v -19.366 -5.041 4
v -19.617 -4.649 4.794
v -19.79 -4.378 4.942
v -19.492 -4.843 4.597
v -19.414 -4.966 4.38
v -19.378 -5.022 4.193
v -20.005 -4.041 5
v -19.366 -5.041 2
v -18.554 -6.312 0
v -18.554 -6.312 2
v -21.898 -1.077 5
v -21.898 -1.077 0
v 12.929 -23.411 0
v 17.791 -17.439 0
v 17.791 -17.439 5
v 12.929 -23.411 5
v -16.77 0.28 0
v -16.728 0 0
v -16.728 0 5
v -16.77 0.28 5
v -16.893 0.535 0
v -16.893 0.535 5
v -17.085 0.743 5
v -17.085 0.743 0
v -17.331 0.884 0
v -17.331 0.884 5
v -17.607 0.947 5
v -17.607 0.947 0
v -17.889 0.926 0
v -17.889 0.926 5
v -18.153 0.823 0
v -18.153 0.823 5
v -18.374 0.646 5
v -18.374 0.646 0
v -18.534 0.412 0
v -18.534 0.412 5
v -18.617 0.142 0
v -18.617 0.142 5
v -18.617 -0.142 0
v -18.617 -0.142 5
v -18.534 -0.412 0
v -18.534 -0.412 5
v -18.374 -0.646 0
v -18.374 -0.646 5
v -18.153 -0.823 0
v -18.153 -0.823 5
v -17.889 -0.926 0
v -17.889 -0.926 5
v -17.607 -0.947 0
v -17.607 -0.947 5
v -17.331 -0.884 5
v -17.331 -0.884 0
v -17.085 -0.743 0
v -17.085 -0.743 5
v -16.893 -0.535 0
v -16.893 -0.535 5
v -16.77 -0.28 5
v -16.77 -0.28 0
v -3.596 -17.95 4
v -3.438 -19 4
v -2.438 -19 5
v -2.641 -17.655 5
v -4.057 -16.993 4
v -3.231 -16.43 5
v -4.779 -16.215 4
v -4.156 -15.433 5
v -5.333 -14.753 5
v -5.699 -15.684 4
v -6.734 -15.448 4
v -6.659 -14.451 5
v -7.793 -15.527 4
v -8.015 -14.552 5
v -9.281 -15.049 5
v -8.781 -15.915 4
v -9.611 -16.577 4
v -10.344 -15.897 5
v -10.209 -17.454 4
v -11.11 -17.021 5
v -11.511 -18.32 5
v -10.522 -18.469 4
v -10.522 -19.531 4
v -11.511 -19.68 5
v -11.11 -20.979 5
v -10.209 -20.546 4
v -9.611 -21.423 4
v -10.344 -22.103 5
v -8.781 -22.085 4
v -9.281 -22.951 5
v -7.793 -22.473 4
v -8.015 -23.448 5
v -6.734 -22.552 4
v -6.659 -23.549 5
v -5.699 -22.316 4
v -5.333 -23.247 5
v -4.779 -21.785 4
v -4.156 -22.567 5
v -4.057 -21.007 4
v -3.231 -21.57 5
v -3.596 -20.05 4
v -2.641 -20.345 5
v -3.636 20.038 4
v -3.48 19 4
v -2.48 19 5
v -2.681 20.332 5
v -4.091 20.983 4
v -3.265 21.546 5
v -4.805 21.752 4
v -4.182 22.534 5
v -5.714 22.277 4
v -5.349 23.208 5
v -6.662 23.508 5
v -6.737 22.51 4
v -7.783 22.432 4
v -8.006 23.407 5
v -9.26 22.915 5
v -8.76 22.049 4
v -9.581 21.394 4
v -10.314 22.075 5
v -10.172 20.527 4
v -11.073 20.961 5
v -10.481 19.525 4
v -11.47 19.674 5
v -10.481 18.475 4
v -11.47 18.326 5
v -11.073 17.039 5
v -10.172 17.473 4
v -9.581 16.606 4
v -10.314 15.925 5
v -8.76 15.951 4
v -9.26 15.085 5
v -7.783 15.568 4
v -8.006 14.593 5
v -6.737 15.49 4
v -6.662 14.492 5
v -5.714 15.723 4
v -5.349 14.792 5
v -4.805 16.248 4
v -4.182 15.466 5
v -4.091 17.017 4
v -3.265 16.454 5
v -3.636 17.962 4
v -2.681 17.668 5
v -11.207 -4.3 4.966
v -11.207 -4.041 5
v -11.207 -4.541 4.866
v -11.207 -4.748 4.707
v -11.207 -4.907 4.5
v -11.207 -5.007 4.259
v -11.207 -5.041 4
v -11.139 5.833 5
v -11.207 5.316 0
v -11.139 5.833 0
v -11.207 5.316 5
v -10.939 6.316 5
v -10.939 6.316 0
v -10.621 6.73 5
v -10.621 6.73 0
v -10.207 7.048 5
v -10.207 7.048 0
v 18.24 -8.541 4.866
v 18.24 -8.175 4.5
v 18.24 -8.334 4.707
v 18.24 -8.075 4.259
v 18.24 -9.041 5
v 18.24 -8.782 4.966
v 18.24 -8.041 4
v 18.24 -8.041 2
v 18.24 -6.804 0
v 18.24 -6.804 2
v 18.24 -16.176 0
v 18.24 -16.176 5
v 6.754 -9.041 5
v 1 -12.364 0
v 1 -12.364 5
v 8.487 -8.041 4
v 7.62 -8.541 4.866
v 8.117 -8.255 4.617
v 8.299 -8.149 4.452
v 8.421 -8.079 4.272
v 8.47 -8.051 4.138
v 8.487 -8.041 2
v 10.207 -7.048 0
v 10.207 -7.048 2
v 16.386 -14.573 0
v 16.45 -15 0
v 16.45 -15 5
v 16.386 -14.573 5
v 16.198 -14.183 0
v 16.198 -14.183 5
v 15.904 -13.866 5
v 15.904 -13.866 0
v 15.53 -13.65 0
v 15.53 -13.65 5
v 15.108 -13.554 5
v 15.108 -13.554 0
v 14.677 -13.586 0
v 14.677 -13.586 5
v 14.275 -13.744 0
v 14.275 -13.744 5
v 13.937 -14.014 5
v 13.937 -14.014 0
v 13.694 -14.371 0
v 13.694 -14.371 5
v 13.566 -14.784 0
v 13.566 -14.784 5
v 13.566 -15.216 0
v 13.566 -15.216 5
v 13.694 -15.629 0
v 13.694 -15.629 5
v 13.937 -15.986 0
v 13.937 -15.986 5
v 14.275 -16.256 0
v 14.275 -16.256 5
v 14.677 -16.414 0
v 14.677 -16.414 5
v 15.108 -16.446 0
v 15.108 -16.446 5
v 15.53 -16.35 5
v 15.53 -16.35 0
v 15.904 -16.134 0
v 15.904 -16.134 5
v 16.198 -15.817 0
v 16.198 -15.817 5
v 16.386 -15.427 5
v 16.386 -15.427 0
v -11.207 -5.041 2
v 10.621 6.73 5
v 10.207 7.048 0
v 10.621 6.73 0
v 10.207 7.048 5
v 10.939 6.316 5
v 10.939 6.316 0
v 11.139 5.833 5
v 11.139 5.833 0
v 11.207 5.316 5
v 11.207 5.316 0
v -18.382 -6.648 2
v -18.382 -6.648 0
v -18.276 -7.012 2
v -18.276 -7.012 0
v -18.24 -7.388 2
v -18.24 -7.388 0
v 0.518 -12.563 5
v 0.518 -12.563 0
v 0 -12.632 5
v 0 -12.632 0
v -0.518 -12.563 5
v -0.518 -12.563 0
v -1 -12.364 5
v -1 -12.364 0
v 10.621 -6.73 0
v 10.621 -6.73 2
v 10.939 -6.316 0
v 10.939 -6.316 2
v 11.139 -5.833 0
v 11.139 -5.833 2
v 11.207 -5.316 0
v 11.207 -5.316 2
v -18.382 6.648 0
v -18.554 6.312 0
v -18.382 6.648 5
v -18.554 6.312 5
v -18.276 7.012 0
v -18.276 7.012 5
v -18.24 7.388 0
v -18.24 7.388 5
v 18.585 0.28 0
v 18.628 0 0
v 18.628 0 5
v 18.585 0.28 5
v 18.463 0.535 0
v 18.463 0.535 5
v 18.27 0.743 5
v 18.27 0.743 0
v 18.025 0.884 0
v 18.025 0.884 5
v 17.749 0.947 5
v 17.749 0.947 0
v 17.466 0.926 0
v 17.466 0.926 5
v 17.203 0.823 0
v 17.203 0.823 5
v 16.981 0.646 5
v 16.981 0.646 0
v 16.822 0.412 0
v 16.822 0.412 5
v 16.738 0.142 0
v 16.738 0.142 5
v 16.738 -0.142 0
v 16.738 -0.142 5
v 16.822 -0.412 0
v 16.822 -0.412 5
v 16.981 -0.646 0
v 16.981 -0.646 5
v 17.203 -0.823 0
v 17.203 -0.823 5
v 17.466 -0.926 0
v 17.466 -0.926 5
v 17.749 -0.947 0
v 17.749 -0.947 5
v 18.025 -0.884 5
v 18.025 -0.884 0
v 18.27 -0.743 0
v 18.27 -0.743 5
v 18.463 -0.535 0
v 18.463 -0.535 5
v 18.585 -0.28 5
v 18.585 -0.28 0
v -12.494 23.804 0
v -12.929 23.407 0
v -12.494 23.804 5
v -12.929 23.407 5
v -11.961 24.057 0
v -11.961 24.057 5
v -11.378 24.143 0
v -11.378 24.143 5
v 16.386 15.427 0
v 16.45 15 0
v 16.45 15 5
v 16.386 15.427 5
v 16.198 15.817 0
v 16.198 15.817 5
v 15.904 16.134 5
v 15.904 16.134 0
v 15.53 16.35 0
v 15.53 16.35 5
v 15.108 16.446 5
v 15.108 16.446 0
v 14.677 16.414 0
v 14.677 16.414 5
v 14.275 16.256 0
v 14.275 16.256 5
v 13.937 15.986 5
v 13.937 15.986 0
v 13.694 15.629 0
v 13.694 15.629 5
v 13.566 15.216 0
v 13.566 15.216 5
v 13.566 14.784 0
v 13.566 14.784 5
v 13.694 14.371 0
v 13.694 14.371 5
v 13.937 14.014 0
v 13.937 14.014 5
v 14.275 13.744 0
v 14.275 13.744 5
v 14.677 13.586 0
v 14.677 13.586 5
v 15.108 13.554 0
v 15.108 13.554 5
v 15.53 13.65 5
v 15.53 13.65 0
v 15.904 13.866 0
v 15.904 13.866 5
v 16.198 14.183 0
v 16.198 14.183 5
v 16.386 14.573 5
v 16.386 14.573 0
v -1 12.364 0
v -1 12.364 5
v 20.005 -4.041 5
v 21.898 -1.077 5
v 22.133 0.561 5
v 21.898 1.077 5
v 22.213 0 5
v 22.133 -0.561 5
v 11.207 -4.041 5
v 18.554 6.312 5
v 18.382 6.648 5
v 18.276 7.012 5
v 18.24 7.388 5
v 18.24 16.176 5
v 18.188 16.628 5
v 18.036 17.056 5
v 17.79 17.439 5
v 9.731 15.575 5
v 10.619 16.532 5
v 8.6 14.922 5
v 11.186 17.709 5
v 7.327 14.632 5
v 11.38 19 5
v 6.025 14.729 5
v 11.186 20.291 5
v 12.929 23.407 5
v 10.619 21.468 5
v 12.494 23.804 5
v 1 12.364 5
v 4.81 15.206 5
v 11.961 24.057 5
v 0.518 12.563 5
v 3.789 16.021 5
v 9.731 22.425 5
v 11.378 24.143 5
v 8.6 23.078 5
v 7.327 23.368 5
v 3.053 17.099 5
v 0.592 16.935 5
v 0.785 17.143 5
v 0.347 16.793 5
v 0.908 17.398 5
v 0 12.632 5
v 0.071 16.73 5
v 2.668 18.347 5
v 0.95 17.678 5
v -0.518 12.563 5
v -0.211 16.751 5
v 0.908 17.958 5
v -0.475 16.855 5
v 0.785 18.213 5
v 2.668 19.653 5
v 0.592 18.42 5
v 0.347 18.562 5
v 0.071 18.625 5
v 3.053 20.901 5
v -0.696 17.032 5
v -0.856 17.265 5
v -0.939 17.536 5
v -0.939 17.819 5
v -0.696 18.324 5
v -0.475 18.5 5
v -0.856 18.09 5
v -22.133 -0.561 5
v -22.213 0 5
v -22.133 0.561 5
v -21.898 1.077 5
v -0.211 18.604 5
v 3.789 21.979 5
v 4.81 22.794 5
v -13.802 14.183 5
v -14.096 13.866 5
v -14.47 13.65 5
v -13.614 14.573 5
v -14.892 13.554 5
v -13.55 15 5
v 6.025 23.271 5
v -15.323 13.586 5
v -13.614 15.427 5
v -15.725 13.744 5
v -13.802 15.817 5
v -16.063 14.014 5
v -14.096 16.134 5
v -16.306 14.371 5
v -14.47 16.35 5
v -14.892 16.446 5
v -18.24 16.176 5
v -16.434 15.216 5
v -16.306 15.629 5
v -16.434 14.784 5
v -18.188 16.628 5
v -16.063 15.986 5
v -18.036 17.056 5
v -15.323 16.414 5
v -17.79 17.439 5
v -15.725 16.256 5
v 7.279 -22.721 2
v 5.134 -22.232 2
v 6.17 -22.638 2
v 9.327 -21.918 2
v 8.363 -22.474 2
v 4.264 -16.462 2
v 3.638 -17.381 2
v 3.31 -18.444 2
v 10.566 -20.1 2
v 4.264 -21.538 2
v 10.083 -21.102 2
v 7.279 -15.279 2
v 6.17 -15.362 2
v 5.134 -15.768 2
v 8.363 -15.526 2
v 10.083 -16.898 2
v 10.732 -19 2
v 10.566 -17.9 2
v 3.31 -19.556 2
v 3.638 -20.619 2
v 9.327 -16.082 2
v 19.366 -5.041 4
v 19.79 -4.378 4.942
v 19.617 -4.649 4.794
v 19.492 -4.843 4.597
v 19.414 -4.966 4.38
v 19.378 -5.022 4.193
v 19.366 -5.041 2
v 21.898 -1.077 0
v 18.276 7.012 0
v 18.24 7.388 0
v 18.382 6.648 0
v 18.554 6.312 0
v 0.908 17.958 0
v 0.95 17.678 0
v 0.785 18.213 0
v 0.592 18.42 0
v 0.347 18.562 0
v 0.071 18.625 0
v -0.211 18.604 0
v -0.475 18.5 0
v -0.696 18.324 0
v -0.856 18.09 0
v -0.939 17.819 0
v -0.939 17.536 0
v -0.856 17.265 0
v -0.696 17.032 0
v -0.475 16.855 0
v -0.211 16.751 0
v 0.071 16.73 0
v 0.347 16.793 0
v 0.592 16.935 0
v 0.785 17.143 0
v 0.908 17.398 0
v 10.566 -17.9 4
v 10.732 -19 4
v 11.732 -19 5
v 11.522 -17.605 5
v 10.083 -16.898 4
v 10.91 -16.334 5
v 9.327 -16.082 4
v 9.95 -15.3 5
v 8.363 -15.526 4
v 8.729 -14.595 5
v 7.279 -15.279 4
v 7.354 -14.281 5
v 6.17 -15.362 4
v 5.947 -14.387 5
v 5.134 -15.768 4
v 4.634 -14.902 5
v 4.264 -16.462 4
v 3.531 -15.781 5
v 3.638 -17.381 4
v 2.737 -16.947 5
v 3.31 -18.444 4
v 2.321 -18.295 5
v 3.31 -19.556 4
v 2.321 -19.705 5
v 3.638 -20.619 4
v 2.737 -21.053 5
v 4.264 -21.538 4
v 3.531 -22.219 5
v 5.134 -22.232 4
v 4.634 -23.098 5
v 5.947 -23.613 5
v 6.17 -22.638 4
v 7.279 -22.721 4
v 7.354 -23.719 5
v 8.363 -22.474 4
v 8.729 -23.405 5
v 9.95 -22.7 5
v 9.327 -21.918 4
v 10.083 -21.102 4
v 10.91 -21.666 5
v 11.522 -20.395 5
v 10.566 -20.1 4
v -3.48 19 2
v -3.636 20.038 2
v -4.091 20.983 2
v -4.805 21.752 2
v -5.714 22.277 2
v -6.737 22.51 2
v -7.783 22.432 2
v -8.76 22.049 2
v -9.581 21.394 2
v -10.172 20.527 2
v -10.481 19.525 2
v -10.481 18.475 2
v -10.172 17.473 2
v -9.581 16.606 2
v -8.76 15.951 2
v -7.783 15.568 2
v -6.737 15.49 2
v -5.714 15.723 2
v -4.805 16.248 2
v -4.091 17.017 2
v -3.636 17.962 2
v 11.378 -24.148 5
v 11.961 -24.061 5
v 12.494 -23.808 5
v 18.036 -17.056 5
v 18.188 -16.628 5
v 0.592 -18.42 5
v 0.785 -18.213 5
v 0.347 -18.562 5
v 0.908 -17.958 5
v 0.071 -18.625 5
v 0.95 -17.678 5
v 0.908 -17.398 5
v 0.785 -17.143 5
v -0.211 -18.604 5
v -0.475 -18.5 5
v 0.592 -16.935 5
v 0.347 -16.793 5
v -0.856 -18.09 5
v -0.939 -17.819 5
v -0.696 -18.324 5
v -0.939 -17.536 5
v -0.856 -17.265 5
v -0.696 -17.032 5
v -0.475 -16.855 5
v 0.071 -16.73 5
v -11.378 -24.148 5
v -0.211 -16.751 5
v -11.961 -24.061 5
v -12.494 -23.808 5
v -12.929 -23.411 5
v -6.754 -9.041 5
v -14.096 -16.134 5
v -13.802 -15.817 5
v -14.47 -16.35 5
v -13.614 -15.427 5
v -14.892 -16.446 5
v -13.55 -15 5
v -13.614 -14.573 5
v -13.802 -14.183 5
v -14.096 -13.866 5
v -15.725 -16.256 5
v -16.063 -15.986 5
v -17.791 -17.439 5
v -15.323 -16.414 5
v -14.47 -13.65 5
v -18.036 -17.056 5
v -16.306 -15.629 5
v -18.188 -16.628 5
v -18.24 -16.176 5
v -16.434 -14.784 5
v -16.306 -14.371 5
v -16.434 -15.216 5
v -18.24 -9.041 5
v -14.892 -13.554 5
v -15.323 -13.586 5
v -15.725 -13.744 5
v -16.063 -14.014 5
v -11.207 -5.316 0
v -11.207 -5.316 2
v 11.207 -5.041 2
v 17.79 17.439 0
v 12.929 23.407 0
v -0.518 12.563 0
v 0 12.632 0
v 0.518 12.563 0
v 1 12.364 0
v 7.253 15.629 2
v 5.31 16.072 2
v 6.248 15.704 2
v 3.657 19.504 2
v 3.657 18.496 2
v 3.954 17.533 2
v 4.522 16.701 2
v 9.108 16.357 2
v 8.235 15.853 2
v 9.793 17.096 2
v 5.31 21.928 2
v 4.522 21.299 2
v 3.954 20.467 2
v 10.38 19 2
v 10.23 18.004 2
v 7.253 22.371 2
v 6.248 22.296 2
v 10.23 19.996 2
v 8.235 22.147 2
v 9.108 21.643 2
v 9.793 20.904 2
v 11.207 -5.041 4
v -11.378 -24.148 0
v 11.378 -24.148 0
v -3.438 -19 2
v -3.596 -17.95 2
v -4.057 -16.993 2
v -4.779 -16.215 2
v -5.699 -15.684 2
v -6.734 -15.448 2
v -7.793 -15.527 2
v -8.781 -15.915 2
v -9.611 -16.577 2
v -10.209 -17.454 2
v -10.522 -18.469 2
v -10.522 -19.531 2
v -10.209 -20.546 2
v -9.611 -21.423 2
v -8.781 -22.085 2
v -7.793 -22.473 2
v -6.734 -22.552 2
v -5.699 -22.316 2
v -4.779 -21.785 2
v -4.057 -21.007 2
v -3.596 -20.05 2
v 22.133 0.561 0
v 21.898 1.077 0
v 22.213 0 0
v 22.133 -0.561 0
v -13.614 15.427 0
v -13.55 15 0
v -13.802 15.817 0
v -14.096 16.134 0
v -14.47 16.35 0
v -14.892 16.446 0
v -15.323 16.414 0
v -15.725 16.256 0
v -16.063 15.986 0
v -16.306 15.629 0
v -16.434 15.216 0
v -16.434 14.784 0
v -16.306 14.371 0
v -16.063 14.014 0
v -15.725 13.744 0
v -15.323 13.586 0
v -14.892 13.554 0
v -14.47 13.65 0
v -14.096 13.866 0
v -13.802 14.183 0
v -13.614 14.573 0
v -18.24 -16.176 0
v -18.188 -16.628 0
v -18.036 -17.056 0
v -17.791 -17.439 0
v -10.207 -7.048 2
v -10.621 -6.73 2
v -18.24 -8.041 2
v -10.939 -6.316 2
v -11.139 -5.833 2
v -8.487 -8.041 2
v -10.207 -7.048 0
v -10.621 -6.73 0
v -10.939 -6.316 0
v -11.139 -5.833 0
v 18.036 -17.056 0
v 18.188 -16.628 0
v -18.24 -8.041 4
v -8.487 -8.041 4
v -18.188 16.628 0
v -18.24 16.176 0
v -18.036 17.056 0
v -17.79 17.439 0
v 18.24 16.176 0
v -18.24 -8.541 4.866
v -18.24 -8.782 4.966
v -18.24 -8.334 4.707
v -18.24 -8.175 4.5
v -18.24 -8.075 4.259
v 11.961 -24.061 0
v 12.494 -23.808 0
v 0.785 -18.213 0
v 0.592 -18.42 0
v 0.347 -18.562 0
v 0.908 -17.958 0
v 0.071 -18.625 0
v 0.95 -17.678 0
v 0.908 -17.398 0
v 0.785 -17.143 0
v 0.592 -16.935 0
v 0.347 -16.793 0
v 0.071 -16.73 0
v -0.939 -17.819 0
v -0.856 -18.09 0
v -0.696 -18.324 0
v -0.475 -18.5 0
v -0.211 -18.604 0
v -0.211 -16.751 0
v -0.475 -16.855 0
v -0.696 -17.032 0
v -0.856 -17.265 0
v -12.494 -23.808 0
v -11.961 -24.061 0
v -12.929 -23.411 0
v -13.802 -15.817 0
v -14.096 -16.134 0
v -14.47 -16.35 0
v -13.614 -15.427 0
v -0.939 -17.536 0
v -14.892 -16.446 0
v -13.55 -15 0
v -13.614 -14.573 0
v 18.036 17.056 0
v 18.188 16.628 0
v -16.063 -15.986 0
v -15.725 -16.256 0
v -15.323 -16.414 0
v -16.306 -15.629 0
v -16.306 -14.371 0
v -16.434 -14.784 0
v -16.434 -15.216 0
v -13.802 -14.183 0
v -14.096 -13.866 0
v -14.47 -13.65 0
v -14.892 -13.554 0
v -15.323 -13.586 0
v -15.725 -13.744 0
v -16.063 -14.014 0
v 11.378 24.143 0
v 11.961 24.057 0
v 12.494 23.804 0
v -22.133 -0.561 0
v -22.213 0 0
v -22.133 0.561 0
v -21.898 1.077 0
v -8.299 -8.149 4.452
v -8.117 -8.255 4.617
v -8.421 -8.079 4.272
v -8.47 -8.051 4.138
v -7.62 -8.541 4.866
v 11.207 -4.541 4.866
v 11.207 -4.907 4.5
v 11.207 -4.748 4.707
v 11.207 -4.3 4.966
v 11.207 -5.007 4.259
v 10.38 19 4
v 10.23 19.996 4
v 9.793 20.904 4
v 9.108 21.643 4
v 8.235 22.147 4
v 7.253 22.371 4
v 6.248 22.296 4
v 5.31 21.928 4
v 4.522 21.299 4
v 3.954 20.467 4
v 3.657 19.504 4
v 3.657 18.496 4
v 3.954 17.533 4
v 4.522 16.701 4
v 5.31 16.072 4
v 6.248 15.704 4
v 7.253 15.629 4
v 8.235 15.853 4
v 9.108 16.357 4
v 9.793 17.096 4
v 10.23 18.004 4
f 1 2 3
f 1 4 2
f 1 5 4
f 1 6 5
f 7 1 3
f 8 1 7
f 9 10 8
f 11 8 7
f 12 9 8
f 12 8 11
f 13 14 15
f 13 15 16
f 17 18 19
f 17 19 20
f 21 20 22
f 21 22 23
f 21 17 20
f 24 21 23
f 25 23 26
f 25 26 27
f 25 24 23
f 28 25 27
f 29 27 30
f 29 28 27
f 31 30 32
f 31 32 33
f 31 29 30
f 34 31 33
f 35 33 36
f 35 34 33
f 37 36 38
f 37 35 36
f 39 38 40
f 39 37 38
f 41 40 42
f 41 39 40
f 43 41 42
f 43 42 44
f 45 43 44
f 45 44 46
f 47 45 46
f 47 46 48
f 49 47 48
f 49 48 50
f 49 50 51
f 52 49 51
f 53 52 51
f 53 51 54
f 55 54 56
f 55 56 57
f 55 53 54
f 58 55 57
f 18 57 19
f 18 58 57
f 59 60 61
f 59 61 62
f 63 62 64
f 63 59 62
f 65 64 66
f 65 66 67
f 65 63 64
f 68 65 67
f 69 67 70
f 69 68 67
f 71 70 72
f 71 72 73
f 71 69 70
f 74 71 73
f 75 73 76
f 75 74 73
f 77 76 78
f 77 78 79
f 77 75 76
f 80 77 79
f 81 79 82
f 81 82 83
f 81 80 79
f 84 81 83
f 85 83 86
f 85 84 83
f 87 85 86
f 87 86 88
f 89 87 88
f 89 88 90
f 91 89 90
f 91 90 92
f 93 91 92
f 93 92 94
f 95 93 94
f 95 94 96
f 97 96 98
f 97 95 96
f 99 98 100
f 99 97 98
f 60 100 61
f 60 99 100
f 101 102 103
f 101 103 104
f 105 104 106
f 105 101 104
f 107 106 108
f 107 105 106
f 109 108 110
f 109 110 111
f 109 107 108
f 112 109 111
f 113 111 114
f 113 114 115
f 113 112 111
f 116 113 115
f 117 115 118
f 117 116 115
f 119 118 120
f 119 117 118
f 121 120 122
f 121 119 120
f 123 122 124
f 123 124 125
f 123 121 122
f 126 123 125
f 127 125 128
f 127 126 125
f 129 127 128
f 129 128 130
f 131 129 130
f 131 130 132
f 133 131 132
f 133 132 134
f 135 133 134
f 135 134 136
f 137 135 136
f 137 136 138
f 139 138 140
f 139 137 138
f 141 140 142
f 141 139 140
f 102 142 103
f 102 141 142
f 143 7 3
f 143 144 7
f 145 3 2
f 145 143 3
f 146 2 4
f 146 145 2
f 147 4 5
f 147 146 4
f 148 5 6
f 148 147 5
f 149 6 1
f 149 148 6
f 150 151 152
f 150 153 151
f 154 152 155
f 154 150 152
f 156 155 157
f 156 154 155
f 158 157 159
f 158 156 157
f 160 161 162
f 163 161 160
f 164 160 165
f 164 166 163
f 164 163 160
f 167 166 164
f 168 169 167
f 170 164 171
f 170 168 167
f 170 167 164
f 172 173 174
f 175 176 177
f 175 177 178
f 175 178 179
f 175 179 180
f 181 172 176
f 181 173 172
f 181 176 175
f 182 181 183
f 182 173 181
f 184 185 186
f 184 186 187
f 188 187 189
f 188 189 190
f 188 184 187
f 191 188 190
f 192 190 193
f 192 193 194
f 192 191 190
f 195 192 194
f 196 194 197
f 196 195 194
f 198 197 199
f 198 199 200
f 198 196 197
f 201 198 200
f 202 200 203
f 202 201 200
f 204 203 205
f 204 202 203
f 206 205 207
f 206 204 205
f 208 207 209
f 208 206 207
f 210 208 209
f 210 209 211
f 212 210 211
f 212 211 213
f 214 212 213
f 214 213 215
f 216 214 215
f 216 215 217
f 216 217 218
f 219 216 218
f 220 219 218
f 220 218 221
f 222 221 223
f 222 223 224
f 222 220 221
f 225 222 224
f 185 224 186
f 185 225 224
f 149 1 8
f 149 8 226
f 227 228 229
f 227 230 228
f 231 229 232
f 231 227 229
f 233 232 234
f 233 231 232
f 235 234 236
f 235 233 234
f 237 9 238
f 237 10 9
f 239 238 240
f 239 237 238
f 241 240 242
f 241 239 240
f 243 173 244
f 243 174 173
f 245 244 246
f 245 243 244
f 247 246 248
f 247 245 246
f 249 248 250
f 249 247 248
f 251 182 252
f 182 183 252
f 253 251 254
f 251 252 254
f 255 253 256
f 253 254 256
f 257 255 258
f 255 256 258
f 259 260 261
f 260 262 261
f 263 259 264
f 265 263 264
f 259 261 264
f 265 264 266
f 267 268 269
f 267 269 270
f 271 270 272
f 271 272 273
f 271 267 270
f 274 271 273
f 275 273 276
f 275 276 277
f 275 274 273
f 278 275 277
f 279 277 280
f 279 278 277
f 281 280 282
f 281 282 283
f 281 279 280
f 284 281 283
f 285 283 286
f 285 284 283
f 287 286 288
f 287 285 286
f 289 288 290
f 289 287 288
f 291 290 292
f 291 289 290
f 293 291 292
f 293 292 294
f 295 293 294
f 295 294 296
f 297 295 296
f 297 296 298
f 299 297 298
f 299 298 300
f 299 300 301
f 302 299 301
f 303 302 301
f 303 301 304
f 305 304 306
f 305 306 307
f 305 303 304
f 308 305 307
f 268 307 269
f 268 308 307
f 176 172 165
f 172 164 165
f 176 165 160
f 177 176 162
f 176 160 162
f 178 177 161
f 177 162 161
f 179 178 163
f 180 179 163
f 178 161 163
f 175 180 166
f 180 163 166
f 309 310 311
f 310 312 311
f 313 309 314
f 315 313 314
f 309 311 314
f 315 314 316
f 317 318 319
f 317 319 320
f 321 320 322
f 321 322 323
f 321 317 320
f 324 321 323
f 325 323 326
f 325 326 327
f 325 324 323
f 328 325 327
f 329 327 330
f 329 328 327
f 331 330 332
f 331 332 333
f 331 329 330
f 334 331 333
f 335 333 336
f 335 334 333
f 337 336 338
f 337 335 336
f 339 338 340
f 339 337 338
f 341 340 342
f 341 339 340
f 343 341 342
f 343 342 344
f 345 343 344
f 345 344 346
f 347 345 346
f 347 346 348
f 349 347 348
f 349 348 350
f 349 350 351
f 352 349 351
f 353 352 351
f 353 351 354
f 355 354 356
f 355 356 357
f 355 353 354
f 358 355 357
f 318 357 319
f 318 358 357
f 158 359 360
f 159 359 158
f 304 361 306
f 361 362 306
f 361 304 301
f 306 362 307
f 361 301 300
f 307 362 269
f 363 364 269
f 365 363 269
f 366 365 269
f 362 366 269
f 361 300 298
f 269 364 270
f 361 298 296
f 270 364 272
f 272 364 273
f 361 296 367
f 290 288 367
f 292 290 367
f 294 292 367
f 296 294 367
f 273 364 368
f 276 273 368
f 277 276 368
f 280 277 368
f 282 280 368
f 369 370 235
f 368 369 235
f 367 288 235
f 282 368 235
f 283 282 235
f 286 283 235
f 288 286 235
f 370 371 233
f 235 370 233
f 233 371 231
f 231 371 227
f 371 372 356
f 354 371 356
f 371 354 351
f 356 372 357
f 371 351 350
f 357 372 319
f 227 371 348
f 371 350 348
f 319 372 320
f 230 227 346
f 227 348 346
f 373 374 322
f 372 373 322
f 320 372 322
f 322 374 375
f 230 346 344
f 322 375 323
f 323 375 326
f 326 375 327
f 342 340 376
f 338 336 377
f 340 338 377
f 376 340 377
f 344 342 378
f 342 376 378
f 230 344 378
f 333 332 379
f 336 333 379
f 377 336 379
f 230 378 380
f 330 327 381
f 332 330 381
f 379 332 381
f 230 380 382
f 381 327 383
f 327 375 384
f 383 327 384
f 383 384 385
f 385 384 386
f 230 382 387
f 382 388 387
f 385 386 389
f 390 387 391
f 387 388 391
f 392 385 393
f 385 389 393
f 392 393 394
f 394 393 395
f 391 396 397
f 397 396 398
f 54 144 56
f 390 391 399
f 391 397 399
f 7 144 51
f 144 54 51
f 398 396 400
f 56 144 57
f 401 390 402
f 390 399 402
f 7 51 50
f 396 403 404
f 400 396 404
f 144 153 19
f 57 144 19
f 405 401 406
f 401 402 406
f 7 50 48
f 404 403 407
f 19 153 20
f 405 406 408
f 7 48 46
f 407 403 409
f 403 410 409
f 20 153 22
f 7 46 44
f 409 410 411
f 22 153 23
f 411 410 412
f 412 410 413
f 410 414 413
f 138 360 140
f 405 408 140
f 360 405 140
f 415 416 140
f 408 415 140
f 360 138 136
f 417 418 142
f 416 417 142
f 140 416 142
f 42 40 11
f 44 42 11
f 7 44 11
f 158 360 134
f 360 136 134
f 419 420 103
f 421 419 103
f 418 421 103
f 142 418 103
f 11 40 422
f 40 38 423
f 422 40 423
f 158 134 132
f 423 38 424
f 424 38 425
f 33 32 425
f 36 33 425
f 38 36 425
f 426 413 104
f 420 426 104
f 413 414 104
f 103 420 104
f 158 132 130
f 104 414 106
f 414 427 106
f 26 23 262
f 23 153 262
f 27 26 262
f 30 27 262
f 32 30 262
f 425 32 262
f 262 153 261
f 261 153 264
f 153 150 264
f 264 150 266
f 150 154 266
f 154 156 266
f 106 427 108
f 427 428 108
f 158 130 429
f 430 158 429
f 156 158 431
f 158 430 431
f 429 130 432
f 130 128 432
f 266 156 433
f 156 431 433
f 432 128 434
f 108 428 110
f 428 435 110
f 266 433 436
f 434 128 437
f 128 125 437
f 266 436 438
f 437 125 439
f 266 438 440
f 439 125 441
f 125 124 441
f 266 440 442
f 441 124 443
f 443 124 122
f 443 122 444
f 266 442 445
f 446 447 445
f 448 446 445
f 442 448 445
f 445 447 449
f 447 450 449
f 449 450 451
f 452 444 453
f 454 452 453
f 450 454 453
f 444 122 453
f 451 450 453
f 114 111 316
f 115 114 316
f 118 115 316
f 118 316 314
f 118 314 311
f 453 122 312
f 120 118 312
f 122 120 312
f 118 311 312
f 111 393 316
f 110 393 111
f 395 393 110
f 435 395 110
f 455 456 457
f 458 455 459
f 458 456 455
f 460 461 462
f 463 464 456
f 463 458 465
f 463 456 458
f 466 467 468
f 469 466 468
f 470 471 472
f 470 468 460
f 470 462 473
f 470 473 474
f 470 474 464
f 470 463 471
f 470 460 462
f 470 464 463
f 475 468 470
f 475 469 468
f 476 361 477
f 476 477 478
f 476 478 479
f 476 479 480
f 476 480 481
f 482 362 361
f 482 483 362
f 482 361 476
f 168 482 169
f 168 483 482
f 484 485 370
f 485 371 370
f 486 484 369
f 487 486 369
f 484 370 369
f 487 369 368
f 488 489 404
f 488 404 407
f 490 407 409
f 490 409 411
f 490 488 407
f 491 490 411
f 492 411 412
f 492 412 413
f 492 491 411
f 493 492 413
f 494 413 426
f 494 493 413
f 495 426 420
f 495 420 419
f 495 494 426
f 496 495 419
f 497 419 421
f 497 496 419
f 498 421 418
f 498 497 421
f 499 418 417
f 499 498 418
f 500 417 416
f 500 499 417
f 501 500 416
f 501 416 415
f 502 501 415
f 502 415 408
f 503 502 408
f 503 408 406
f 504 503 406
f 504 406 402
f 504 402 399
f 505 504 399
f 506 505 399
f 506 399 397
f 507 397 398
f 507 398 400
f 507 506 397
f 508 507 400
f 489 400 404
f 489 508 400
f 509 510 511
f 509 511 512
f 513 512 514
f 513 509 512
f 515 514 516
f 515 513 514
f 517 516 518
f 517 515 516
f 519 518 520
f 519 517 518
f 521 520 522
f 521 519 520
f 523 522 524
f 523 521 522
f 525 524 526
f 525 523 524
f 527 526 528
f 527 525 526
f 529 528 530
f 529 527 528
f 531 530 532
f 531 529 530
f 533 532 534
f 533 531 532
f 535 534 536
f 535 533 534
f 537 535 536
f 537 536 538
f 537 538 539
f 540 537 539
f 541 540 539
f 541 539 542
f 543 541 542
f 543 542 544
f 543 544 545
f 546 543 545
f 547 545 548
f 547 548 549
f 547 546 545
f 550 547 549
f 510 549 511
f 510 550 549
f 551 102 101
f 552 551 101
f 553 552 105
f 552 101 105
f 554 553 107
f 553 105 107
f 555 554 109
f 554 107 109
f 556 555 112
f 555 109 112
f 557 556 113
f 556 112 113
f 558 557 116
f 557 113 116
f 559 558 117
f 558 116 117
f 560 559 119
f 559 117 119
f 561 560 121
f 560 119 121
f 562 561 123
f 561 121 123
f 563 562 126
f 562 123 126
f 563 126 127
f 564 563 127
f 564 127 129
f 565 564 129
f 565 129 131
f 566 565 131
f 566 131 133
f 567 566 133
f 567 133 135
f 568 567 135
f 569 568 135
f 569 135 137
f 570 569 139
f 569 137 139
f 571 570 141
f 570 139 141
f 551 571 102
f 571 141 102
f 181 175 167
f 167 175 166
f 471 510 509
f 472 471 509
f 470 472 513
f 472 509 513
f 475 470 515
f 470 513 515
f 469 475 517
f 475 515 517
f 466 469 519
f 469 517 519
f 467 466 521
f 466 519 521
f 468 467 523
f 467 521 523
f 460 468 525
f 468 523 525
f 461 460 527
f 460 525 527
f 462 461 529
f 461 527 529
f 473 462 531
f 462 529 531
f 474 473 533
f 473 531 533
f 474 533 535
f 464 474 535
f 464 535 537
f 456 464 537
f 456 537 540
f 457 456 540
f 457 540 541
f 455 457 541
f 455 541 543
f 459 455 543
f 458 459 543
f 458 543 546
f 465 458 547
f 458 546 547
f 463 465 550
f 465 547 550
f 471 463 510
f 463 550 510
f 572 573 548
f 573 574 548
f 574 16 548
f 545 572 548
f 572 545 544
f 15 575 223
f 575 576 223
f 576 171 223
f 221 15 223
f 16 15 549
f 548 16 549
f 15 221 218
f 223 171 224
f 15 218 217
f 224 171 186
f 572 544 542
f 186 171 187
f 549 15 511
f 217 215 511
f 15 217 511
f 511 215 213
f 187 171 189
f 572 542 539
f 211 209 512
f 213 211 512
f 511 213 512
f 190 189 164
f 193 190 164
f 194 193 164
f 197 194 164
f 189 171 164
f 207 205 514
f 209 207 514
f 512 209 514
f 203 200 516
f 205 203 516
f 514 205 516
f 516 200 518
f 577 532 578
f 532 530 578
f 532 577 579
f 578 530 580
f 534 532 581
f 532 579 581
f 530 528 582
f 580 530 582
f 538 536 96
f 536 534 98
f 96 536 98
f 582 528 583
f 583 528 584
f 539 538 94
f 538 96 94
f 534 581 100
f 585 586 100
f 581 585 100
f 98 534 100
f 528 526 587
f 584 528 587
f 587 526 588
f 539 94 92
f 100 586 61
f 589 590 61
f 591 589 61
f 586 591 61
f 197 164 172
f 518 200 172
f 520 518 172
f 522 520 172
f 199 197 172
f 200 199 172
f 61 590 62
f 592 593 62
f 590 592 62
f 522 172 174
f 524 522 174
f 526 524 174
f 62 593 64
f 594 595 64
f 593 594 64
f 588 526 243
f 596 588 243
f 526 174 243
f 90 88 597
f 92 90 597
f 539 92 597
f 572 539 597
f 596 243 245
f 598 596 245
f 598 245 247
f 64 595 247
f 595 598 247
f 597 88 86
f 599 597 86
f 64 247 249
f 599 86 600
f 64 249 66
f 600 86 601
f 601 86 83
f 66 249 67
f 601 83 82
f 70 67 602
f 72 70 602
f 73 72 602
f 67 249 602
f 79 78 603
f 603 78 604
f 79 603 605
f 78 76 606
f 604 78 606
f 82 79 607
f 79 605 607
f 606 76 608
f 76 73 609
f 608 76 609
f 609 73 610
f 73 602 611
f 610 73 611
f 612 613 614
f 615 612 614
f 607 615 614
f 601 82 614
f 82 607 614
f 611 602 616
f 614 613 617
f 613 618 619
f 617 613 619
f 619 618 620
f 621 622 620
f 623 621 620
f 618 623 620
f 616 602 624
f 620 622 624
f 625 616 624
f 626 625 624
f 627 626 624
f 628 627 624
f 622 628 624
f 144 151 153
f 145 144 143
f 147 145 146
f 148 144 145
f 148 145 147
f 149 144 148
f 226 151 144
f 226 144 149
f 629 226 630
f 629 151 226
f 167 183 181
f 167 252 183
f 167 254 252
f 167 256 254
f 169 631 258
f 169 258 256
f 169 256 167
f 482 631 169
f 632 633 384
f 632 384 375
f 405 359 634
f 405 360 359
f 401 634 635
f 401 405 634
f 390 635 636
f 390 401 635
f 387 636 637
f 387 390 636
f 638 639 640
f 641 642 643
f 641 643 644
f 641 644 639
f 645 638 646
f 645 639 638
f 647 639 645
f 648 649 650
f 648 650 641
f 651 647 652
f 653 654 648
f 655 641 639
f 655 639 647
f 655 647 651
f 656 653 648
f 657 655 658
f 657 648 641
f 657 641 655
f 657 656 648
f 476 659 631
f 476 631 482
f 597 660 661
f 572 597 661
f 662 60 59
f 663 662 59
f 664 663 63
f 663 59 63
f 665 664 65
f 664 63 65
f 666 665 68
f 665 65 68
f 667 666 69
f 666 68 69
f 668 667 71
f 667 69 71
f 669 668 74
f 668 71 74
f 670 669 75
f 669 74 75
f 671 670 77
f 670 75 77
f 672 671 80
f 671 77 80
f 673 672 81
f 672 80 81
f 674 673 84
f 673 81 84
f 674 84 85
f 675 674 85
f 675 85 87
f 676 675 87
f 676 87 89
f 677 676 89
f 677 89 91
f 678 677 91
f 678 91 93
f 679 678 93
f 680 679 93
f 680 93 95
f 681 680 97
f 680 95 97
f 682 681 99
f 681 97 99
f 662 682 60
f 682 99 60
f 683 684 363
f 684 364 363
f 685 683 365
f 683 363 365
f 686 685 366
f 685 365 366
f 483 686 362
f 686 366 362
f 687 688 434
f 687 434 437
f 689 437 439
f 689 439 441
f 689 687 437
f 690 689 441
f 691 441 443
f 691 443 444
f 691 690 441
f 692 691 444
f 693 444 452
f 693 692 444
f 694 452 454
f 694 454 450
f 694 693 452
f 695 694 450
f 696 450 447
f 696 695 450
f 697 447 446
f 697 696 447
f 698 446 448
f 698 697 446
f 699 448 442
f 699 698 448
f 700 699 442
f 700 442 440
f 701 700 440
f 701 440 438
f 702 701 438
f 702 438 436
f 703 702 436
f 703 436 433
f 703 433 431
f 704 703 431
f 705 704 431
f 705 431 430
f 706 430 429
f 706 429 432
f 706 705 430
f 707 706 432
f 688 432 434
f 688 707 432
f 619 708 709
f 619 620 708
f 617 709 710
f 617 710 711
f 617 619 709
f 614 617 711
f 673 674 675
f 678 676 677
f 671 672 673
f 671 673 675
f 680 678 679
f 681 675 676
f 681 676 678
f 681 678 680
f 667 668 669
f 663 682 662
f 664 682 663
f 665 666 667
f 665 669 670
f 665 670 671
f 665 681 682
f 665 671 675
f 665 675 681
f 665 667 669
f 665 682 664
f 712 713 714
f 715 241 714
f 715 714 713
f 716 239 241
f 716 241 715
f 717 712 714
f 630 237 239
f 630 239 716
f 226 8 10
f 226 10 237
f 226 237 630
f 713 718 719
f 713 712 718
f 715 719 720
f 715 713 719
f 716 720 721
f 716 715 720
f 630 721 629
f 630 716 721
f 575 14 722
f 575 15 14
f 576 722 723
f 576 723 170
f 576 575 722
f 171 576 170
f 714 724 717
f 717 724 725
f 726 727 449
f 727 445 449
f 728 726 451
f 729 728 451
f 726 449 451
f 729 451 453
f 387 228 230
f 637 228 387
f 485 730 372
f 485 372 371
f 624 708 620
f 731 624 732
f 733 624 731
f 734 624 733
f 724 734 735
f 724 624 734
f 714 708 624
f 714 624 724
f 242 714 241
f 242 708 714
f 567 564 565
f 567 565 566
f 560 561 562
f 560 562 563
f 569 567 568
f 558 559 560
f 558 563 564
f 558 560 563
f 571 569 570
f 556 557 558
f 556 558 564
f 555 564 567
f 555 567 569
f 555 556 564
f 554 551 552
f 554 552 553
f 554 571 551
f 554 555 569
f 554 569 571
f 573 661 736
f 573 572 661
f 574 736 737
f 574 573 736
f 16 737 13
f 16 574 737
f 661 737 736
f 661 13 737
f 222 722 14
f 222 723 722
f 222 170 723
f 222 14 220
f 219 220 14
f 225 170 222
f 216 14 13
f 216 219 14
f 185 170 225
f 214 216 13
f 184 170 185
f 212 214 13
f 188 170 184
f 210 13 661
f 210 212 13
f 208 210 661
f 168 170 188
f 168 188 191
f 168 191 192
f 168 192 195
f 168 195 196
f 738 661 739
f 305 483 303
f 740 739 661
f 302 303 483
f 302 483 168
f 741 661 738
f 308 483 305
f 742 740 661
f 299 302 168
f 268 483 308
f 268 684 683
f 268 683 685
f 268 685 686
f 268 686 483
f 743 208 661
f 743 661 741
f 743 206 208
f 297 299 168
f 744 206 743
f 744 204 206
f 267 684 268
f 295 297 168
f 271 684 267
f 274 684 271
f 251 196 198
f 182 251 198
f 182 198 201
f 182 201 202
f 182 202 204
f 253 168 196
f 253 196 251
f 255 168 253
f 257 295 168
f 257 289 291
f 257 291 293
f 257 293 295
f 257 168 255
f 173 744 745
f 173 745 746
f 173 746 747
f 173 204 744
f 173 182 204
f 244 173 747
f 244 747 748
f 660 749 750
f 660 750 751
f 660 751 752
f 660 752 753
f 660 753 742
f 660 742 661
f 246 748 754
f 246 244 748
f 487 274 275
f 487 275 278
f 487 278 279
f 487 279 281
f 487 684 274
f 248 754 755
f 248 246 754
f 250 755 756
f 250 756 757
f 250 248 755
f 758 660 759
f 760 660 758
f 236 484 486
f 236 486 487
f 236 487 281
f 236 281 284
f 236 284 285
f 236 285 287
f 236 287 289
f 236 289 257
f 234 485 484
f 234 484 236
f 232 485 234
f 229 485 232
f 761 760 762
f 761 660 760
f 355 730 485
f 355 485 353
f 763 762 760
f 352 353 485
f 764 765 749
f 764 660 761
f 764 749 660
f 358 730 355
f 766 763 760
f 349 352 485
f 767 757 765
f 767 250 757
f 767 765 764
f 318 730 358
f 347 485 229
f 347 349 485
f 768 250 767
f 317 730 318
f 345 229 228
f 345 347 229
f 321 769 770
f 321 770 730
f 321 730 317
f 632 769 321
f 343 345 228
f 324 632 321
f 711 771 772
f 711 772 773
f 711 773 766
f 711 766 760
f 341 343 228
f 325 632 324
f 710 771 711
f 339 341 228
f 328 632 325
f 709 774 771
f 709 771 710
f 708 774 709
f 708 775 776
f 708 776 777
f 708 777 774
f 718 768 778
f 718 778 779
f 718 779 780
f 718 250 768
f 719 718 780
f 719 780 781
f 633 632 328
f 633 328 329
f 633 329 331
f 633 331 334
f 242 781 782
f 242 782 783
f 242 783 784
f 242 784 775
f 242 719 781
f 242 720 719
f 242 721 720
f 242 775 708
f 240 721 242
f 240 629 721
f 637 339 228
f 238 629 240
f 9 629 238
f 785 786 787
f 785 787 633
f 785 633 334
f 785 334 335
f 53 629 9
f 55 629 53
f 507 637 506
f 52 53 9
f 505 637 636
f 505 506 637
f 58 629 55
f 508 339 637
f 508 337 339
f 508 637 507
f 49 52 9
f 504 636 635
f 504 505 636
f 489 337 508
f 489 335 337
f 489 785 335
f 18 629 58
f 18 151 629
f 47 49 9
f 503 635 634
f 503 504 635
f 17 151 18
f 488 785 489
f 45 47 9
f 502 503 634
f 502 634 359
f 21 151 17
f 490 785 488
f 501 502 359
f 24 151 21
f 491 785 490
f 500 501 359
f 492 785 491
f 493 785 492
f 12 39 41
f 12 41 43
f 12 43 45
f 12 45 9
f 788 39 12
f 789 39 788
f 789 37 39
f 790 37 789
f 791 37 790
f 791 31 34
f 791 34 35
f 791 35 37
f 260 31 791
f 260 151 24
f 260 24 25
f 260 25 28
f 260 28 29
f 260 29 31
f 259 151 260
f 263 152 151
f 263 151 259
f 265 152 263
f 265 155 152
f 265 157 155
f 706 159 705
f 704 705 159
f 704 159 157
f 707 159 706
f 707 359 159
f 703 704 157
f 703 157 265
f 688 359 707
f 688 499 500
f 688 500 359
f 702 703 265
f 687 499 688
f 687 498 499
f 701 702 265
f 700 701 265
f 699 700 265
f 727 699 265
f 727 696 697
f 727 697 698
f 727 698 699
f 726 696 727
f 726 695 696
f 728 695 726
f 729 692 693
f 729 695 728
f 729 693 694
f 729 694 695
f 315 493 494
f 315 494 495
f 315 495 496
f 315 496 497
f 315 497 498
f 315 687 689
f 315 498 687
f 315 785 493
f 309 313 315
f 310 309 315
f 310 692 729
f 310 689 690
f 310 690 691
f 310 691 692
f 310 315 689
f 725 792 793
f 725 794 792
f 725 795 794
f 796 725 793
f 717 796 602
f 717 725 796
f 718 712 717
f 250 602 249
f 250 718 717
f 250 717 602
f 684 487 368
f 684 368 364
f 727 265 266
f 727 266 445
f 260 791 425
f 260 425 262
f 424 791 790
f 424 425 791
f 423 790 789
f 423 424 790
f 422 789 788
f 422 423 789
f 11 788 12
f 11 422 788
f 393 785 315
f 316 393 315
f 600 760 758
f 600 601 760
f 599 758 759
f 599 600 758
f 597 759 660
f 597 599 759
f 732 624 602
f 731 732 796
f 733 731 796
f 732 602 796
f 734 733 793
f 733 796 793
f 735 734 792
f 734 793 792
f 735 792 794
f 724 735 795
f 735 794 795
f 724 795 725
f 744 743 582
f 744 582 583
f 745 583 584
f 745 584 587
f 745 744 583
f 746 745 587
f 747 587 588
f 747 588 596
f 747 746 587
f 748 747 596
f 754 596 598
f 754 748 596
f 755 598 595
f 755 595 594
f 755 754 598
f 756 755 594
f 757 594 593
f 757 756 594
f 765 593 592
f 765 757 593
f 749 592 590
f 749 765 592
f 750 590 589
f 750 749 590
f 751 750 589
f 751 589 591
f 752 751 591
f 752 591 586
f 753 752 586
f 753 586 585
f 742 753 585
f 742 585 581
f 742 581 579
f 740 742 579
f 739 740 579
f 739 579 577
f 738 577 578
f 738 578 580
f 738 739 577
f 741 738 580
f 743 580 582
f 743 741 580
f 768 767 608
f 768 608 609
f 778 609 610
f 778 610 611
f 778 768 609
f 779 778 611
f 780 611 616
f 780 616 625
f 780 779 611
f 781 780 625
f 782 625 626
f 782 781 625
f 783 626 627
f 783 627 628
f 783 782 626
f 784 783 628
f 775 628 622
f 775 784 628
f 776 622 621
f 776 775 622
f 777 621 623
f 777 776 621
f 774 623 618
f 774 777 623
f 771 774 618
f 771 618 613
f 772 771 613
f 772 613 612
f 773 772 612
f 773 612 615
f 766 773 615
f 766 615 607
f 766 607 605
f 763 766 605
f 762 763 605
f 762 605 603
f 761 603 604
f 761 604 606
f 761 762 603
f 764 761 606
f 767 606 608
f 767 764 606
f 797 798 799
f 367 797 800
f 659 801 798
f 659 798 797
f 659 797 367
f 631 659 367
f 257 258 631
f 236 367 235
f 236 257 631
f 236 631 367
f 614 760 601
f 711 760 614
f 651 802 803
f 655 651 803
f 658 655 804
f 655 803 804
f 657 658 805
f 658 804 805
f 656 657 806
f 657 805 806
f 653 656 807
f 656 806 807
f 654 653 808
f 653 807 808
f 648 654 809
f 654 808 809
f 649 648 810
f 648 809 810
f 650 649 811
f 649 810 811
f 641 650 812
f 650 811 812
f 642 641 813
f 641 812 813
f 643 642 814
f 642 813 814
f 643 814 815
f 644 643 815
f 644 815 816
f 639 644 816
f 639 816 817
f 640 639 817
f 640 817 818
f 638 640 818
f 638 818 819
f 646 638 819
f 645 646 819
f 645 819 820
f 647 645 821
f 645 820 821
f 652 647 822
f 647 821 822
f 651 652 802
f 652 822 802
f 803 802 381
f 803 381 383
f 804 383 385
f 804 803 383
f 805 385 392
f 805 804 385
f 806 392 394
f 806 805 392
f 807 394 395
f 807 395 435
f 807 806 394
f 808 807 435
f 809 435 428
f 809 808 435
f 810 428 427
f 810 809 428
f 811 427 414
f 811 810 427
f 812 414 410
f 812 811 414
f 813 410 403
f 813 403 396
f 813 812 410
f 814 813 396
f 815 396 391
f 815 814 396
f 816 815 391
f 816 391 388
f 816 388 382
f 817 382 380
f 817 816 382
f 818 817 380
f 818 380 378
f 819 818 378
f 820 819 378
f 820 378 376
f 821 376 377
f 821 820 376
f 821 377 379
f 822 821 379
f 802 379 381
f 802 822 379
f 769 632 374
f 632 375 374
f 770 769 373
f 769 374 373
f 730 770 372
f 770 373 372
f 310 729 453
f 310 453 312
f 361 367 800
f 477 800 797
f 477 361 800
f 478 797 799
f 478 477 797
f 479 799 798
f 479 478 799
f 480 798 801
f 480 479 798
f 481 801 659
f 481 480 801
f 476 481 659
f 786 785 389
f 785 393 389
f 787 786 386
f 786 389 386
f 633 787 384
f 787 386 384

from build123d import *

# Parameters (mm, degrees)
SKETCH_R        = 1.45
SKETCH_R_2      = 0.95
PAD_DEPTH       = 5
SKETCH001_R     = 3.562029
SKETCH001_R_2   = 3.731918
SKETCH001_R_3   = 3.520265
SKETCH001_R_4   = 3.380429
POCKET_DEPTH    = 3
SKETCH002_W     = 46.716316
SKETCH002_H     = 3
POCKET001_DEPTH = 3
FILLET_R        = 2
FILLET001_R     = 2
FILLET002_R     = 1
CHAMFER_SIZE    = 1


with BuildPart() as part:
    # Sketch → Pad (new body)
    with BuildSketch(Plane.XY):
        Polygon((-22.586229, 0), (-18.23987, 6.804103), (-18.23987, 16.887657), (-12.328823, 24.143423), (0, 24.143423), (12.328823, 24.143423), (18.23987, 16.887657), (18.23987, 6.804103), (22.586229, 0), (18.23987, -6.804103), (18.23987, -16.887657), (12.328823, -24.148312), (0.02983, -24.148312), (-12.328823, -24.148312), (-18.23987, -16.887657), (-18.23987, -6.804103), align=None)
        with Locations((-15, 15)):
            Circle(SKETCH_R, mode=Mode.SUBTRACT)
        with Locations((0, 17.67767)):
            Circle(SKETCH_R_2, mode=Mode.SUBTRACT)
        with Locations((15, 15)):
            Circle(SKETCH_R, mode=Mode.SUBTRACT)
        with Locations((15, -15)):
            Circle(SKETCH_R, mode=Mode.SUBTRACT)
        with Locations((-15, -15)):
            Circle(SKETCH_R, mode=Mode.SUBTRACT)
        with Locations((0, -17.67767)):
            Circle(SKETCH_R_2, mode=Mode.SUBTRACT)
        with Locations((-17.67767, 0)):
            Circle(SKETCH_R_2, mode=Mode.SUBTRACT)
        with Locations((17.67767, 0)):
            Circle(SKETCH_R_2, mode=Mode.SUBTRACT)
        Polygon((11.207193, -6.470476), (11.207193, 6.470476), (0, 12.940952), (-11.207193, 6.470476), (-11.207193, -6.470476), (0, -12.940952), align=None, mode=Mode.SUBTRACT)
    extrude(amount=PAD_DEPTH)

    # Sketch001 (on Face32 of Pad) → Pocket (cut)
    with BuildSketch(Plane.XY.offset(5)):
        with Locations((-7, -19)):
            Circle(SKETCH001_R)
        with Locations((7, -19)):
            Circle(SKETCH001_R_2)
        with Locations((-7, 19)):
            Circle(SKETCH001_R_3)
        with Locations((7, 19)):
            Circle(SKETCH001_R_4)
    extrude(amount=-POCKET_DEPTH, mode=Mode.SUBTRACT)

    # Sketch002 (on Face5 of Pocket) → Pocket001 (cut)
    with BuildSketch(Plane.XY.offset(5)):
        with Locations((0.200285, -6.541265)):
            Rectangle(SKETCH002_W, SKETCH002_H)
    extrude(amount=-POCKET001_DEPTH, mode=Mode.SUBTRACT)

    # Fillet
    fillet_edges = [part.edges().sort_by_distance(p)[0] for p in [
        (22.586229, 0, 2.5),
        (-22.586229, 0, 2.5),
        (18.23987, -16.887657, 2.5),
        (12.328823, -24.148312, 2.5),
        (-12.328823, -24.148312, 2.5),
        (-18.23987, -16.887657, 2.5),
        (-18.23987, 16.887657, 2.5),
        (-18.23987, 6.804103, 2.5),
        (-18.23987, -6.804103, 1),
        (-12.328823, 24.143423, 2.5),
        (12.328823, 24.143423, 2.5),
        (18.23987, 16.887657, 2.5),
        (18.23987, 6.804103, 2.5),
    ]]
    fillet(fillet_edges, radius=FILLET_R)

    # Fillet001
    fillet001_edges = [part.edges().sort_by_distance(p)[0] for p in [
        (11.207193, -6.470476, 1),
        (0, -12.940952, 2.5),
        (11.207193, 6.470476, 2.5),
        (0, 12.940952, 2.5),
        (-11.207193, 6.470476, 2.5),
        (-11.207193, -6.470476, 1),
    ]]
    fillet(fillet001_edges, radius=FILLET001_R)

    # Fillet002
    fillet002_edges = [part.edges().sort_by_distance(p)[0] for p in [
        (15.286569, -5.041265, 5),
        (13.363188, -8.041265, 5),
        (-15.286569, -5.041265, 5),
        (-13.363188, -8.041265, 5),
    ]]
    fillet(fillet002_edges, radius=FILLET002_R)

    # Chamfer
    chamfer_edges = [part.edges().sort_by_distance(p)[0] for p in [
        (3.619571, 19, 5),
        (-10.520265, 19, 5),
        (3.268082, -19, 5),
        (-10.562029, -19, 5),
    ]]
    chamfer(chamfer_edges, length=CHAMFER_SIZE)


solid = part.part
